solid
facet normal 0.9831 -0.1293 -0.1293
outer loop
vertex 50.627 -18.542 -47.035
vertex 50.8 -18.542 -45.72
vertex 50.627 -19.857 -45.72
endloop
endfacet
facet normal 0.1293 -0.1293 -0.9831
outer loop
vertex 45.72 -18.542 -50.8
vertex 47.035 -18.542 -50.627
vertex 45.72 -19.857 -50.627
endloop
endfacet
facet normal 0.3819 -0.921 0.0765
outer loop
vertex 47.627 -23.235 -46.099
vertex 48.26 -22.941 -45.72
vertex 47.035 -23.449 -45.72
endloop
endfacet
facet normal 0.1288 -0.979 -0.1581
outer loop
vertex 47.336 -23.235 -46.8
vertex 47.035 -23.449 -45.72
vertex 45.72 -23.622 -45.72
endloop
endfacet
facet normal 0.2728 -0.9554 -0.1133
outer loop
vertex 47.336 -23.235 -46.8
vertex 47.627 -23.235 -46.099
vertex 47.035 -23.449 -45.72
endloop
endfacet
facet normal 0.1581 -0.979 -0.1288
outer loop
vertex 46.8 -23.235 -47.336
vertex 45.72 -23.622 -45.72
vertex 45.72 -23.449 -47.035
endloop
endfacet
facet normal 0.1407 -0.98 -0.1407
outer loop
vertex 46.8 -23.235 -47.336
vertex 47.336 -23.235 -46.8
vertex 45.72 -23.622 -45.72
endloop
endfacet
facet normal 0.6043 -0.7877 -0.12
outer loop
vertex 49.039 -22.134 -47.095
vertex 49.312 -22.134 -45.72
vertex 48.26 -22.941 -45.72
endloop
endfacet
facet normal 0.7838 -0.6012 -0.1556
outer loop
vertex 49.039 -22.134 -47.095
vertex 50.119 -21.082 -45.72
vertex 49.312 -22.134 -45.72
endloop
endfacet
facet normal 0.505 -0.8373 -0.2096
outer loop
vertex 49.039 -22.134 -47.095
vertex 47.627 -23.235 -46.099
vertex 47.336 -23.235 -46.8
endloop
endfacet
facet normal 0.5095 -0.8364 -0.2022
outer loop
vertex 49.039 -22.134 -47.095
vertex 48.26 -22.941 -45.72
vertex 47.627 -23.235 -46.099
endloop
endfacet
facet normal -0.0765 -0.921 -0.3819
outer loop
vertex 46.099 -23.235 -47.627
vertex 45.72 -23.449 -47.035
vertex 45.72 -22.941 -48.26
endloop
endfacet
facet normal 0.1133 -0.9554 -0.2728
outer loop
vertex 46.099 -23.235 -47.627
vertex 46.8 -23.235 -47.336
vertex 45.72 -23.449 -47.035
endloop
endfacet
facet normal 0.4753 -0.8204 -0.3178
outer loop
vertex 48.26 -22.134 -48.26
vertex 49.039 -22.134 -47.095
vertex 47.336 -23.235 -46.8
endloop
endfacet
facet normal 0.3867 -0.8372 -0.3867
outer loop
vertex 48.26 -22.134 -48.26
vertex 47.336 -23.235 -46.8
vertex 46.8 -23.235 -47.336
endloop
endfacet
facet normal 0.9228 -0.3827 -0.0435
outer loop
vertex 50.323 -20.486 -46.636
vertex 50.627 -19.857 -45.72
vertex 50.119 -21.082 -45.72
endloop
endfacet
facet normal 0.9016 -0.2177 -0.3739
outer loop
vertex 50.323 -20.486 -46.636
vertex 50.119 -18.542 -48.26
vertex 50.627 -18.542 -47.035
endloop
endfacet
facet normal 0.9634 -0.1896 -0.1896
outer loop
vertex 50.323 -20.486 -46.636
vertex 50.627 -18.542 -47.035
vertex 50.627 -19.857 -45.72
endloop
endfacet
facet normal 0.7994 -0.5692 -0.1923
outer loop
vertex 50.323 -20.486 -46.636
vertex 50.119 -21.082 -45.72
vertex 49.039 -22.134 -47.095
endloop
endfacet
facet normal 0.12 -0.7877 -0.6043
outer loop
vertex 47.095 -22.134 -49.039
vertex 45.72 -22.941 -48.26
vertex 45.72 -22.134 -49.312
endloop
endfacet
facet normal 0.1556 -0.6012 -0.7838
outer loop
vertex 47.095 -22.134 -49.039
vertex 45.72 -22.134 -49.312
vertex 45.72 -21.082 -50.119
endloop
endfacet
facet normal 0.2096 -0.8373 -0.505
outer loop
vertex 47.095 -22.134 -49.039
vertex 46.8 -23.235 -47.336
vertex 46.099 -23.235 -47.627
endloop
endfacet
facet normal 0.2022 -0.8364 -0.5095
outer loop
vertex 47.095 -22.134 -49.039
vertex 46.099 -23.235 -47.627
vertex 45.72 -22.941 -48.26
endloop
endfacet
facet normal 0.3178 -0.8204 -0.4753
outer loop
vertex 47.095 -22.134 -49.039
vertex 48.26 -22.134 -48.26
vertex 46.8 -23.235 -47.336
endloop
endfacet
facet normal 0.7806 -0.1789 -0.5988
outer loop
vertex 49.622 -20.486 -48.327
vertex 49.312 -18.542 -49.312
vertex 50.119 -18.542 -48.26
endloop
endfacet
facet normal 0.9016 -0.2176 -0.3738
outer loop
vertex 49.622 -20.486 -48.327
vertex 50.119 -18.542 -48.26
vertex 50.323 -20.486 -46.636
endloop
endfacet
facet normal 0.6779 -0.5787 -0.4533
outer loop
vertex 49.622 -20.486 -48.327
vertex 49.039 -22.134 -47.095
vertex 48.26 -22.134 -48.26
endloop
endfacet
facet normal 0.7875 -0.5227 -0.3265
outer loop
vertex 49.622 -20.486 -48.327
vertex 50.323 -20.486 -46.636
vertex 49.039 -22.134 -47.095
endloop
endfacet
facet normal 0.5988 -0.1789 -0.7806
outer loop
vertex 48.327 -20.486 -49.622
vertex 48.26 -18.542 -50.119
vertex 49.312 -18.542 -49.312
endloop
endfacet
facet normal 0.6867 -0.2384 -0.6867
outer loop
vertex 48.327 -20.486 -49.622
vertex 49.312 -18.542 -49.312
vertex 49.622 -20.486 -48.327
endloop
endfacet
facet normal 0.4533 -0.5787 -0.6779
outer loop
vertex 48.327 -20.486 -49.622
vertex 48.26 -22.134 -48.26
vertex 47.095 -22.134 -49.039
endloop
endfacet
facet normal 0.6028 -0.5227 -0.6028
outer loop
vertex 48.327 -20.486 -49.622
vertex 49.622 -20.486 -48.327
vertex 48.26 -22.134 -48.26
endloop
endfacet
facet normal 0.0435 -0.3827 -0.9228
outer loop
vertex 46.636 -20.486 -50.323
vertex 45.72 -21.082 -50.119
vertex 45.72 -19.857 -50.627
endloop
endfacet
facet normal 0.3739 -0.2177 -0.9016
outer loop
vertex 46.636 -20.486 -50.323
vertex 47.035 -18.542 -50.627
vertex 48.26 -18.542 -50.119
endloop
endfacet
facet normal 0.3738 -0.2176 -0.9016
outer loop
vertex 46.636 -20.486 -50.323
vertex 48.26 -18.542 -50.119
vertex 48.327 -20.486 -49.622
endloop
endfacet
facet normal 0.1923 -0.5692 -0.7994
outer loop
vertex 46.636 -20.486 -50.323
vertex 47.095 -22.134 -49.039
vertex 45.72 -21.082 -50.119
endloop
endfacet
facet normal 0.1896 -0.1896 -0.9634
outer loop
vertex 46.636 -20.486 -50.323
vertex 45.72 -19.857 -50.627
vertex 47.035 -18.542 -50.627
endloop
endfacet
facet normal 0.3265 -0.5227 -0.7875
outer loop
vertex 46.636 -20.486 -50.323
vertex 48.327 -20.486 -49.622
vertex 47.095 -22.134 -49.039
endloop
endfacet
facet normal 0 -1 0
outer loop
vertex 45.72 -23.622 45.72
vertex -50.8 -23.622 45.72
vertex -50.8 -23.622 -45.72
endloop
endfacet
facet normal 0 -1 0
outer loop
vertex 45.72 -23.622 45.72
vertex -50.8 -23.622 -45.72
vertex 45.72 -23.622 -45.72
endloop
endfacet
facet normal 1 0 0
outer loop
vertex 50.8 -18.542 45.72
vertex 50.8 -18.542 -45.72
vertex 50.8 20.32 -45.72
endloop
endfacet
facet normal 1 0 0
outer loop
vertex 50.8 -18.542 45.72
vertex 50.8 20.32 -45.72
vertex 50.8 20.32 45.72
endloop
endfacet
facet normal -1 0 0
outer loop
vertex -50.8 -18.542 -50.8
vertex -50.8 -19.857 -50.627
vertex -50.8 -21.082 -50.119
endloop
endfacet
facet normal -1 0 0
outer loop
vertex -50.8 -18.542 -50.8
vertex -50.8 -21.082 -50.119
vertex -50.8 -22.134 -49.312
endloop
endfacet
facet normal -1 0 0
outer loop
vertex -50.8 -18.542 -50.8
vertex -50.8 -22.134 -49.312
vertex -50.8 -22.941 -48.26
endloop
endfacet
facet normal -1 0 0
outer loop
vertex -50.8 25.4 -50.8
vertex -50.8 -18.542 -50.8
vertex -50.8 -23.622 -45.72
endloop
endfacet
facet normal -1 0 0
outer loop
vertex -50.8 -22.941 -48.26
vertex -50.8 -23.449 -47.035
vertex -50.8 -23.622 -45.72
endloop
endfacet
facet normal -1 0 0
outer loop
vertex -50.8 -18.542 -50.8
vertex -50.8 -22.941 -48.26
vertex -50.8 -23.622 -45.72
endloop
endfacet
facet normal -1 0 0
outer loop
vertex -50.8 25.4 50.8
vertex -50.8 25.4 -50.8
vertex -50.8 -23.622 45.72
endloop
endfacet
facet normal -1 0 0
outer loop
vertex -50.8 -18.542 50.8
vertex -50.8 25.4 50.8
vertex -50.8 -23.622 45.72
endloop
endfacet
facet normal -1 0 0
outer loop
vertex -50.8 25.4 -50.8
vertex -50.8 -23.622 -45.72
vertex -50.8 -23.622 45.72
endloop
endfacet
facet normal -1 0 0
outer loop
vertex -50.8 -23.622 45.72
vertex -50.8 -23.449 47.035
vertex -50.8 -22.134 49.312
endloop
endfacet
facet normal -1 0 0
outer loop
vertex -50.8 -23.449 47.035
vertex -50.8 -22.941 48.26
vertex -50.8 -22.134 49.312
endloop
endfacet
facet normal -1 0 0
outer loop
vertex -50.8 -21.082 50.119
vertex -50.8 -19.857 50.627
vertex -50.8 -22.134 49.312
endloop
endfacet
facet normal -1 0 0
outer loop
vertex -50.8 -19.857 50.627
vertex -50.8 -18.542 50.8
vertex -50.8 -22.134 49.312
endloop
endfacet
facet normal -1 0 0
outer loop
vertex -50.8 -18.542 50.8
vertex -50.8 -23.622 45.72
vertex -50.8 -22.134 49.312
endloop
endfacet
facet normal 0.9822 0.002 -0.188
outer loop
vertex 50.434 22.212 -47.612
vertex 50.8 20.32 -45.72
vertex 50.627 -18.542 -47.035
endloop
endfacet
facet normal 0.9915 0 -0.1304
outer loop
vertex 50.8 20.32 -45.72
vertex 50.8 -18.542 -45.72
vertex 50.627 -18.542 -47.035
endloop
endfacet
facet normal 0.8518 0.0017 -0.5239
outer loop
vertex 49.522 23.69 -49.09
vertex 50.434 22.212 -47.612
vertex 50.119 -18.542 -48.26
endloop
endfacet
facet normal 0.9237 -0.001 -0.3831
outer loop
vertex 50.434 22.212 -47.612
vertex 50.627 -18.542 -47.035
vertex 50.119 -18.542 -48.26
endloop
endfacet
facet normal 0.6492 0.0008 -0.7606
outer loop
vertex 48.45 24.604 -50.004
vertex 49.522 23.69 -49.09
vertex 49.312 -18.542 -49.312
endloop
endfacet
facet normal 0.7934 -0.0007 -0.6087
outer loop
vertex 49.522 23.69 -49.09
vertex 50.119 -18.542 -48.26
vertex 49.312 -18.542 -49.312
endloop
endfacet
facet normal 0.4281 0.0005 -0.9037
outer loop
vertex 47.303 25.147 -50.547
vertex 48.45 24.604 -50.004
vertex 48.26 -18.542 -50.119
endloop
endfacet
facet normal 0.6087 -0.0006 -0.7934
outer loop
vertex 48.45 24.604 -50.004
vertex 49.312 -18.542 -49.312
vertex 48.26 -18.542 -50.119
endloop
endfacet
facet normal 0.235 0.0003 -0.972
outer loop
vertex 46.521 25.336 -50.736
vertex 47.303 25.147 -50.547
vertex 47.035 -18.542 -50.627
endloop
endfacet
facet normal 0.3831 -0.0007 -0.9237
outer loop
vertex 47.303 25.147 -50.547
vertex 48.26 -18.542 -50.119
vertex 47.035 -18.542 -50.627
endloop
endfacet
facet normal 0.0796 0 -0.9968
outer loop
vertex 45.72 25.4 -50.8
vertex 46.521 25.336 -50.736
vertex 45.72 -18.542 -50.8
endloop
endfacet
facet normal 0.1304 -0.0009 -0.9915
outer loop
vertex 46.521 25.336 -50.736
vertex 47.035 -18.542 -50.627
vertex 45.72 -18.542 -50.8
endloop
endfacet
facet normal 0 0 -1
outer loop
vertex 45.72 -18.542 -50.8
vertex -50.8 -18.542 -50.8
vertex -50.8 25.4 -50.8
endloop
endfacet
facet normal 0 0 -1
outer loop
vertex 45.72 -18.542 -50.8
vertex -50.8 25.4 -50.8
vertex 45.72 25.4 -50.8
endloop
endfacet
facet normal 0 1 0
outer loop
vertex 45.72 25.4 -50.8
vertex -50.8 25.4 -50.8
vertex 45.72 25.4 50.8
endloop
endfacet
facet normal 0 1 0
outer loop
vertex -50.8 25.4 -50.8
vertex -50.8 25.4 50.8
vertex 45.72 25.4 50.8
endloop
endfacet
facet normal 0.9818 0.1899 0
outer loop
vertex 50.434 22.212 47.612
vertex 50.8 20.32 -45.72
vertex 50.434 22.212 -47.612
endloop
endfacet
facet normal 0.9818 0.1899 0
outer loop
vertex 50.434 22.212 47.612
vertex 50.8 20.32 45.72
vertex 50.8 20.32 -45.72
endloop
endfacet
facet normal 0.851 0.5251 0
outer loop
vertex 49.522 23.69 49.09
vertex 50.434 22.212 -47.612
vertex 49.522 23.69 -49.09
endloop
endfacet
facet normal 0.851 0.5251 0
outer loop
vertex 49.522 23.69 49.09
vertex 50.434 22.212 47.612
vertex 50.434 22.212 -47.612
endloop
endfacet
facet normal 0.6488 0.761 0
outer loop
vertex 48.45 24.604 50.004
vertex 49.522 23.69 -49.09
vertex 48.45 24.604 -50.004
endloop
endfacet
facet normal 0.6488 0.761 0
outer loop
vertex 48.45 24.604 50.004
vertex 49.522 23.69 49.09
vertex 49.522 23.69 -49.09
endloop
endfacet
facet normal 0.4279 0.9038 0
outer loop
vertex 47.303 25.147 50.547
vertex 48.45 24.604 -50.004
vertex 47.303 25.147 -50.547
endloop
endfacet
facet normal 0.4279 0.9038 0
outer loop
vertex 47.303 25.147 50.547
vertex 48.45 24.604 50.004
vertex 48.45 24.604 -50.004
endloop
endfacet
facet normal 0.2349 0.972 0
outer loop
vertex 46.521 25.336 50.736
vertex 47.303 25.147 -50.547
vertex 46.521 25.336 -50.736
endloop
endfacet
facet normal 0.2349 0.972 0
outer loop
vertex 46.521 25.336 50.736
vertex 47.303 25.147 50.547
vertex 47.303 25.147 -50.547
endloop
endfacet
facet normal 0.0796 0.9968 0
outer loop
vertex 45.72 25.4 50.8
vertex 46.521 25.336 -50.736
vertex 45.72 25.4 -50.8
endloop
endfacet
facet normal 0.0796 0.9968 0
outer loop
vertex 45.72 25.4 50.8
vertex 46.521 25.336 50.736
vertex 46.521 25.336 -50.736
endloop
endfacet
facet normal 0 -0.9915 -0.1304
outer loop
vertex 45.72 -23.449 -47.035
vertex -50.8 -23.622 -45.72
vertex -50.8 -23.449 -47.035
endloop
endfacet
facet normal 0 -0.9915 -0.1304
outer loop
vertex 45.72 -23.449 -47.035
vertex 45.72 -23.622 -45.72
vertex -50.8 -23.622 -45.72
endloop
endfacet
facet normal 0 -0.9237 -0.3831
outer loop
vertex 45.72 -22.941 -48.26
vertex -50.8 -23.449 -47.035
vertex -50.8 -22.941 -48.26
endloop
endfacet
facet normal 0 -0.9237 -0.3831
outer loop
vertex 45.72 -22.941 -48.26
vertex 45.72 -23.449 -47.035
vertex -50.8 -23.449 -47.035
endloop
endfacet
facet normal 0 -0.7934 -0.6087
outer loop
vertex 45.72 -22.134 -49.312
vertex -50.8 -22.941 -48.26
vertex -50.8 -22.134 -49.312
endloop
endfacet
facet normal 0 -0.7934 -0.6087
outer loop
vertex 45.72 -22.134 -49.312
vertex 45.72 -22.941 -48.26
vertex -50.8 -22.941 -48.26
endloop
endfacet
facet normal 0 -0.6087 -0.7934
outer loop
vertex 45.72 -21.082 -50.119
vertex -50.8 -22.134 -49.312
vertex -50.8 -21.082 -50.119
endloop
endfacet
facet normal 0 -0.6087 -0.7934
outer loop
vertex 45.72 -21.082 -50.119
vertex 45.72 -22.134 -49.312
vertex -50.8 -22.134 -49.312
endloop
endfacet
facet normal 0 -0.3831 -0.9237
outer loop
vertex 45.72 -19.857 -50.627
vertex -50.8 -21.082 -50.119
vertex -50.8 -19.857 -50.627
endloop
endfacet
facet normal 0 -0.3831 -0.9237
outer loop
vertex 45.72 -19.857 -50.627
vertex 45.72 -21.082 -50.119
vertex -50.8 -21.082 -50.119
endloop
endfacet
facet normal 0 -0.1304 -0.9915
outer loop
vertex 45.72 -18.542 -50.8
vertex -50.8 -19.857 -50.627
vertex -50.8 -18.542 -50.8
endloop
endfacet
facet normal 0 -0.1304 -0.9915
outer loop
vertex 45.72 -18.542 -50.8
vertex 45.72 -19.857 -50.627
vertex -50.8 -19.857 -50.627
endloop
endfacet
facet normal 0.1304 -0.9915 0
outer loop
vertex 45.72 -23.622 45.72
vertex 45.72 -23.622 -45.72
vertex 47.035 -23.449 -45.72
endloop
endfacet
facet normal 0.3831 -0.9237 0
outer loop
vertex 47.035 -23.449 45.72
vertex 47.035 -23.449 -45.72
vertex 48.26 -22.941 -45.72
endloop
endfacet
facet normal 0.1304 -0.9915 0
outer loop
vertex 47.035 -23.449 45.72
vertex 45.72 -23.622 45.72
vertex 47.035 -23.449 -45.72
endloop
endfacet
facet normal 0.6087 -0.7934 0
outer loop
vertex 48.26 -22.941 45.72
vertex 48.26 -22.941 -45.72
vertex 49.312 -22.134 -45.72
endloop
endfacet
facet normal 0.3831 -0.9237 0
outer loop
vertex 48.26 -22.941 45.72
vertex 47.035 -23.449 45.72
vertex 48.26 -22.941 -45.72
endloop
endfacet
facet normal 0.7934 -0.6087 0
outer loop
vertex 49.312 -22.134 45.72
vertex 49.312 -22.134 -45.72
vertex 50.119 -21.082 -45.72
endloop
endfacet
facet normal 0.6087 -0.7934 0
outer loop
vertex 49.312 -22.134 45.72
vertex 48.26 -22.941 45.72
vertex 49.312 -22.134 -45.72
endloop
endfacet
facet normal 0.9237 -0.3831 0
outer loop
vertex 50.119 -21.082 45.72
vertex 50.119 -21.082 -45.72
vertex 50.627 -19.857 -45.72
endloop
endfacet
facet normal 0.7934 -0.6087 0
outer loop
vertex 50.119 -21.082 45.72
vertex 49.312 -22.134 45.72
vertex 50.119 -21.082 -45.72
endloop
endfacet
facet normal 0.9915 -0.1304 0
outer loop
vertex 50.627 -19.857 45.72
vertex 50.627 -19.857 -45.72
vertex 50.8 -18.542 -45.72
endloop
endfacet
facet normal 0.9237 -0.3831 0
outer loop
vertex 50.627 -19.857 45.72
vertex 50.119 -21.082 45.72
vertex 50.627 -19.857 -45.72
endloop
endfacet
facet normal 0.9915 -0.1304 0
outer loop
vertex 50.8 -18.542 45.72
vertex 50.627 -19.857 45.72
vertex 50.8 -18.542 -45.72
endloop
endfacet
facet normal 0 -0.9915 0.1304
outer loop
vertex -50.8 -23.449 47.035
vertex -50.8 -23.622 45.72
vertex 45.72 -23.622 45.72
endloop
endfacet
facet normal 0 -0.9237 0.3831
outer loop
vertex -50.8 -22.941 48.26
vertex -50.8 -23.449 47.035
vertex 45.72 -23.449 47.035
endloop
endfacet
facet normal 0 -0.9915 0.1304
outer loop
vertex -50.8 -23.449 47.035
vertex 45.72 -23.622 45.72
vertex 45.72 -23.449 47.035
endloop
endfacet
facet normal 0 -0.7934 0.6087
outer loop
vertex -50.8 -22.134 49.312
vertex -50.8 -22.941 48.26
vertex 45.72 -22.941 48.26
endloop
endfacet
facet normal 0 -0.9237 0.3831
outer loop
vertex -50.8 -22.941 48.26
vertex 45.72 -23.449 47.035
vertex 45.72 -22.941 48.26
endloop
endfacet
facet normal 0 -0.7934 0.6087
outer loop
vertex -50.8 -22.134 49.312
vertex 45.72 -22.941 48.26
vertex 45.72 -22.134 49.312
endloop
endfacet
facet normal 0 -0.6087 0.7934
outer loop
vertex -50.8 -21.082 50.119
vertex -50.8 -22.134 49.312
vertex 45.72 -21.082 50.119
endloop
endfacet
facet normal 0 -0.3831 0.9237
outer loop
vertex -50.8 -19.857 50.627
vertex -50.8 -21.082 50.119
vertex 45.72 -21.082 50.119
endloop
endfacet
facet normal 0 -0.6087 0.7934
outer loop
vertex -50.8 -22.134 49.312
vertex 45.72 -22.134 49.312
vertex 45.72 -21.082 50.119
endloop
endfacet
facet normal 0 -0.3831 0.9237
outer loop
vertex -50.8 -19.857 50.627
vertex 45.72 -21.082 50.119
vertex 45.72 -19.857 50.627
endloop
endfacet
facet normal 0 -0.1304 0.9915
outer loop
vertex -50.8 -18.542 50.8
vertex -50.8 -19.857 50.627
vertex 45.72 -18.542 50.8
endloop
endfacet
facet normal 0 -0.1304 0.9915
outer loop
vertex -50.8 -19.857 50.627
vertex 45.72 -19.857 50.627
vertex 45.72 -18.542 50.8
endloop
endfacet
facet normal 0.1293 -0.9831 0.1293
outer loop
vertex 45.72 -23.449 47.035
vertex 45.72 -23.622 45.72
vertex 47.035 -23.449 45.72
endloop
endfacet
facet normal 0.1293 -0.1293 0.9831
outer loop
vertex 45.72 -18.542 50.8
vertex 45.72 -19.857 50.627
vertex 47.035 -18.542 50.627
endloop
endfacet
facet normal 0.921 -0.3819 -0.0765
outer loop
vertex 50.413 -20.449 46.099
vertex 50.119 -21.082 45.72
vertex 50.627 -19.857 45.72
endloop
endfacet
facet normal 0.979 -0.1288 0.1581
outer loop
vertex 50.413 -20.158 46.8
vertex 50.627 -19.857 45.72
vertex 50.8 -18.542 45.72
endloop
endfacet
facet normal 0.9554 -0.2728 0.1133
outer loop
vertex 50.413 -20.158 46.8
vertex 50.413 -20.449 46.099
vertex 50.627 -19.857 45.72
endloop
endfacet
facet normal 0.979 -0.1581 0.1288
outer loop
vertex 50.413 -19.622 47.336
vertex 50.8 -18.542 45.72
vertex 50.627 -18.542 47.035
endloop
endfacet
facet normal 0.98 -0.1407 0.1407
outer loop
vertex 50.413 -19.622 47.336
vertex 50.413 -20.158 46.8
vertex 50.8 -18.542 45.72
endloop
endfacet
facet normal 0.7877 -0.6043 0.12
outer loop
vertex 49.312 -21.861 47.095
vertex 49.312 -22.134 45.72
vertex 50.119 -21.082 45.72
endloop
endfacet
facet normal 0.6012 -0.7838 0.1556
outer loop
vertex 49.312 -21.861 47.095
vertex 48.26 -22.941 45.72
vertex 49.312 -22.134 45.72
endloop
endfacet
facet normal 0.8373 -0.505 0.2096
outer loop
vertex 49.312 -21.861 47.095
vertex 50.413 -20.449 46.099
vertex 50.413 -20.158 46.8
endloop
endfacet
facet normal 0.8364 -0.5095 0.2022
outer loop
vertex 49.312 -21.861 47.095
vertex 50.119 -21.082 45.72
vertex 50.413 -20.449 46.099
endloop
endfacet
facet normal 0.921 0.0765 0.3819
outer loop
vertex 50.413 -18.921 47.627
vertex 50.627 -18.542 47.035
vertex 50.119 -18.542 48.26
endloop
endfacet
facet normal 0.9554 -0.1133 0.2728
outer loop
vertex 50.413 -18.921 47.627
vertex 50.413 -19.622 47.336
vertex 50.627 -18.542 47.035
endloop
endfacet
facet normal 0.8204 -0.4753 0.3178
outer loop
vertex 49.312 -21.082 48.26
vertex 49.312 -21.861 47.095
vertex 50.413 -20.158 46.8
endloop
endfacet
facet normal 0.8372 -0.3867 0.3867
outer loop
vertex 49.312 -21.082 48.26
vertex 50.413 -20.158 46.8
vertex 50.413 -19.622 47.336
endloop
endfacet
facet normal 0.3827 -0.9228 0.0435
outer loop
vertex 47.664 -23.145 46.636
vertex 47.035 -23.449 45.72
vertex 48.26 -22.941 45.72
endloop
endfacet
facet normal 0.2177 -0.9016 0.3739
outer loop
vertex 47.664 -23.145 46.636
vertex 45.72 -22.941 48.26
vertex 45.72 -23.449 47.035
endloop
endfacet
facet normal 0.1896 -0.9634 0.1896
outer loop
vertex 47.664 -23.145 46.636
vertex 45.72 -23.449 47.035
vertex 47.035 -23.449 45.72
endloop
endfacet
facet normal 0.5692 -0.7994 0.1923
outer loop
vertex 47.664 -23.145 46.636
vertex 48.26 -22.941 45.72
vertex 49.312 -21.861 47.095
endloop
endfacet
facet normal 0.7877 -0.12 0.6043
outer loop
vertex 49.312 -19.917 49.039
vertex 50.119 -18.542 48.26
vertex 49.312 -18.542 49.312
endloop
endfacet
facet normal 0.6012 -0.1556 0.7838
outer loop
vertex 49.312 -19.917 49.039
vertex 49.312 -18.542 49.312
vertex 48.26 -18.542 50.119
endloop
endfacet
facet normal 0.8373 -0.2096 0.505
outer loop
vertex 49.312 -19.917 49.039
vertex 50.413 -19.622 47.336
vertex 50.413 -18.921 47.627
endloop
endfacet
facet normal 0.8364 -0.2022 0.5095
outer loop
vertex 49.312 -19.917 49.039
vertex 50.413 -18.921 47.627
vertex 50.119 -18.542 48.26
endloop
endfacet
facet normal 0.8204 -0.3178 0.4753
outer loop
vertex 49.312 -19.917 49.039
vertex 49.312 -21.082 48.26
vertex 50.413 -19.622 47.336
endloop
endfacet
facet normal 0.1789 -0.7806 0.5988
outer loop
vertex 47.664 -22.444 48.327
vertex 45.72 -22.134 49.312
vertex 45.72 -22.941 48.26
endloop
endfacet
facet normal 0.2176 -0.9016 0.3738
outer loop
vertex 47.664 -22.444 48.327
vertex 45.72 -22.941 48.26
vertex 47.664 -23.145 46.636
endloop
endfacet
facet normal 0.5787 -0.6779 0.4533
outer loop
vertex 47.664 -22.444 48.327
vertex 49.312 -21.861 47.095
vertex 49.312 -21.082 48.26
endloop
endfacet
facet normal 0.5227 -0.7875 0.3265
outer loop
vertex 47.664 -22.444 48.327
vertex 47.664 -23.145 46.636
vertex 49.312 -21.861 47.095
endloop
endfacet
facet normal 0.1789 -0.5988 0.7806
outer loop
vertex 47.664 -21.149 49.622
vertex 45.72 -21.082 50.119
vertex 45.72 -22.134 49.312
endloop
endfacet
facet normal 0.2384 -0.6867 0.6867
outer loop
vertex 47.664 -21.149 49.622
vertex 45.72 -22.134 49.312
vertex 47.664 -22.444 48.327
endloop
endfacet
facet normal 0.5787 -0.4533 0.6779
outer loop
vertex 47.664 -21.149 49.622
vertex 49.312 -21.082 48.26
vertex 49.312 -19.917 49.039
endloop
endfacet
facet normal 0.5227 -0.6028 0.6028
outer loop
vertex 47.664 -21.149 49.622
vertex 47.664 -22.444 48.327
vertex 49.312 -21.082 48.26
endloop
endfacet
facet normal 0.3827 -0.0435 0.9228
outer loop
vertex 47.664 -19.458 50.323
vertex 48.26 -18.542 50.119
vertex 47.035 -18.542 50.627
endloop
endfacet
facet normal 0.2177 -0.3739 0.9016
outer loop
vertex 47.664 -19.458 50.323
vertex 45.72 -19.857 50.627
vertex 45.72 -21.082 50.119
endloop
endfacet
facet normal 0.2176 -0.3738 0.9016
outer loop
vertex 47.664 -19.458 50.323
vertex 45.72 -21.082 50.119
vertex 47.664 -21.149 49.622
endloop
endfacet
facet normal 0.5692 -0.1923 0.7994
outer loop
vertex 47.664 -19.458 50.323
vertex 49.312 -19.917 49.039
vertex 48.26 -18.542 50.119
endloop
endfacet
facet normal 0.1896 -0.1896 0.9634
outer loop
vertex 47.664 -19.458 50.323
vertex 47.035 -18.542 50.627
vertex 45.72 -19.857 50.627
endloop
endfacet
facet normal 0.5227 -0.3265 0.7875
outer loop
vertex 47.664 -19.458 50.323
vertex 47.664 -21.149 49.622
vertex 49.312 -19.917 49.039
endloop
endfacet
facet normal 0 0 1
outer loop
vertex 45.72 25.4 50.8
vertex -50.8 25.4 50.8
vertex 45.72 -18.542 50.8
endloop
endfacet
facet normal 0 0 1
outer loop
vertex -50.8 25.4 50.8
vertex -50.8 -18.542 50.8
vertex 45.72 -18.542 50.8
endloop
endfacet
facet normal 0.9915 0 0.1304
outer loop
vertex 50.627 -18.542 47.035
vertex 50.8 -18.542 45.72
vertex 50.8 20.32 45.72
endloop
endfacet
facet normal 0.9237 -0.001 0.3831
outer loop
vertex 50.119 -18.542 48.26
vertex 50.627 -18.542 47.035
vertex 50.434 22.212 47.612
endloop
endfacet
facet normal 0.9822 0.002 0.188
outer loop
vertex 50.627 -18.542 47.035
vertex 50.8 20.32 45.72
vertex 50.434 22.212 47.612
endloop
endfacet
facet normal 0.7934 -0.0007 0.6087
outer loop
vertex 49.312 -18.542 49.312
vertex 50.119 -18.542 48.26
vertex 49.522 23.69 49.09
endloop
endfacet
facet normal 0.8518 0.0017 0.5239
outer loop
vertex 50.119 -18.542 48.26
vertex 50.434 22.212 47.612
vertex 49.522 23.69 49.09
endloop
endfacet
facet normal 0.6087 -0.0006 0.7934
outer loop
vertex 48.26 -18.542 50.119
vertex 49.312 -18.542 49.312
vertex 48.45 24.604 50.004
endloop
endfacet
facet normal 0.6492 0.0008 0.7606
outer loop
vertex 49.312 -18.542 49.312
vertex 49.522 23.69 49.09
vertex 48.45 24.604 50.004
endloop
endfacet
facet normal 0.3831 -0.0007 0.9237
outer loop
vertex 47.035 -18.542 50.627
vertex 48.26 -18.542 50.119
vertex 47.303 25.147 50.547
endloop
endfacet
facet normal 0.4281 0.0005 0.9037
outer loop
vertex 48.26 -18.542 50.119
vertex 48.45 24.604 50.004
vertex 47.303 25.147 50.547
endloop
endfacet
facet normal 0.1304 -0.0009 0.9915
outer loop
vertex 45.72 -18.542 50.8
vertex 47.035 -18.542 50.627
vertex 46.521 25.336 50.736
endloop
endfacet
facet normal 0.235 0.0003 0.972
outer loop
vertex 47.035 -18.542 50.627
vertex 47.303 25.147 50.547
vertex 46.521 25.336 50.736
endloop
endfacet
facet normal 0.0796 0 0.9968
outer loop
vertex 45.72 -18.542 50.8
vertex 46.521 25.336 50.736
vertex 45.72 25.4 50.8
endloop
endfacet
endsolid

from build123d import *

# Parameters (mm, degrees)
F0_W          = 101.6
F0_H          = 101.6
F1_DEPTH      = 23.622
F1_DEPTH_BACK = 25.4
F2_R          = 5.08


with BuildPart() as f1:
    # F0 (on Front) → F1 (new body, two sides)
    with BuildSketch(Plane.XZ) as f1_sk:
        Rectangle(F0_W, F0_H)
    extrude(amount=F1_DEPTH)
    extrude(f1_sk.sketch, amount=-F1_DEPTH_BACK)

    # F2
    f2_edges = [f1.edges().sort_by_distance(p)[0] for p in [
        (0, -23.622, 50.8),
        (50.8, 0.889, -50.8),
        (50.8, -23.622, 0),
        (50.8, 0.889, 50.8),
        (50.8, 25.4, 0),
        (0, -23.622, -50.8),
    ]]
    fillet(f2_edges, radius=F2_R)


solid = f1.part
